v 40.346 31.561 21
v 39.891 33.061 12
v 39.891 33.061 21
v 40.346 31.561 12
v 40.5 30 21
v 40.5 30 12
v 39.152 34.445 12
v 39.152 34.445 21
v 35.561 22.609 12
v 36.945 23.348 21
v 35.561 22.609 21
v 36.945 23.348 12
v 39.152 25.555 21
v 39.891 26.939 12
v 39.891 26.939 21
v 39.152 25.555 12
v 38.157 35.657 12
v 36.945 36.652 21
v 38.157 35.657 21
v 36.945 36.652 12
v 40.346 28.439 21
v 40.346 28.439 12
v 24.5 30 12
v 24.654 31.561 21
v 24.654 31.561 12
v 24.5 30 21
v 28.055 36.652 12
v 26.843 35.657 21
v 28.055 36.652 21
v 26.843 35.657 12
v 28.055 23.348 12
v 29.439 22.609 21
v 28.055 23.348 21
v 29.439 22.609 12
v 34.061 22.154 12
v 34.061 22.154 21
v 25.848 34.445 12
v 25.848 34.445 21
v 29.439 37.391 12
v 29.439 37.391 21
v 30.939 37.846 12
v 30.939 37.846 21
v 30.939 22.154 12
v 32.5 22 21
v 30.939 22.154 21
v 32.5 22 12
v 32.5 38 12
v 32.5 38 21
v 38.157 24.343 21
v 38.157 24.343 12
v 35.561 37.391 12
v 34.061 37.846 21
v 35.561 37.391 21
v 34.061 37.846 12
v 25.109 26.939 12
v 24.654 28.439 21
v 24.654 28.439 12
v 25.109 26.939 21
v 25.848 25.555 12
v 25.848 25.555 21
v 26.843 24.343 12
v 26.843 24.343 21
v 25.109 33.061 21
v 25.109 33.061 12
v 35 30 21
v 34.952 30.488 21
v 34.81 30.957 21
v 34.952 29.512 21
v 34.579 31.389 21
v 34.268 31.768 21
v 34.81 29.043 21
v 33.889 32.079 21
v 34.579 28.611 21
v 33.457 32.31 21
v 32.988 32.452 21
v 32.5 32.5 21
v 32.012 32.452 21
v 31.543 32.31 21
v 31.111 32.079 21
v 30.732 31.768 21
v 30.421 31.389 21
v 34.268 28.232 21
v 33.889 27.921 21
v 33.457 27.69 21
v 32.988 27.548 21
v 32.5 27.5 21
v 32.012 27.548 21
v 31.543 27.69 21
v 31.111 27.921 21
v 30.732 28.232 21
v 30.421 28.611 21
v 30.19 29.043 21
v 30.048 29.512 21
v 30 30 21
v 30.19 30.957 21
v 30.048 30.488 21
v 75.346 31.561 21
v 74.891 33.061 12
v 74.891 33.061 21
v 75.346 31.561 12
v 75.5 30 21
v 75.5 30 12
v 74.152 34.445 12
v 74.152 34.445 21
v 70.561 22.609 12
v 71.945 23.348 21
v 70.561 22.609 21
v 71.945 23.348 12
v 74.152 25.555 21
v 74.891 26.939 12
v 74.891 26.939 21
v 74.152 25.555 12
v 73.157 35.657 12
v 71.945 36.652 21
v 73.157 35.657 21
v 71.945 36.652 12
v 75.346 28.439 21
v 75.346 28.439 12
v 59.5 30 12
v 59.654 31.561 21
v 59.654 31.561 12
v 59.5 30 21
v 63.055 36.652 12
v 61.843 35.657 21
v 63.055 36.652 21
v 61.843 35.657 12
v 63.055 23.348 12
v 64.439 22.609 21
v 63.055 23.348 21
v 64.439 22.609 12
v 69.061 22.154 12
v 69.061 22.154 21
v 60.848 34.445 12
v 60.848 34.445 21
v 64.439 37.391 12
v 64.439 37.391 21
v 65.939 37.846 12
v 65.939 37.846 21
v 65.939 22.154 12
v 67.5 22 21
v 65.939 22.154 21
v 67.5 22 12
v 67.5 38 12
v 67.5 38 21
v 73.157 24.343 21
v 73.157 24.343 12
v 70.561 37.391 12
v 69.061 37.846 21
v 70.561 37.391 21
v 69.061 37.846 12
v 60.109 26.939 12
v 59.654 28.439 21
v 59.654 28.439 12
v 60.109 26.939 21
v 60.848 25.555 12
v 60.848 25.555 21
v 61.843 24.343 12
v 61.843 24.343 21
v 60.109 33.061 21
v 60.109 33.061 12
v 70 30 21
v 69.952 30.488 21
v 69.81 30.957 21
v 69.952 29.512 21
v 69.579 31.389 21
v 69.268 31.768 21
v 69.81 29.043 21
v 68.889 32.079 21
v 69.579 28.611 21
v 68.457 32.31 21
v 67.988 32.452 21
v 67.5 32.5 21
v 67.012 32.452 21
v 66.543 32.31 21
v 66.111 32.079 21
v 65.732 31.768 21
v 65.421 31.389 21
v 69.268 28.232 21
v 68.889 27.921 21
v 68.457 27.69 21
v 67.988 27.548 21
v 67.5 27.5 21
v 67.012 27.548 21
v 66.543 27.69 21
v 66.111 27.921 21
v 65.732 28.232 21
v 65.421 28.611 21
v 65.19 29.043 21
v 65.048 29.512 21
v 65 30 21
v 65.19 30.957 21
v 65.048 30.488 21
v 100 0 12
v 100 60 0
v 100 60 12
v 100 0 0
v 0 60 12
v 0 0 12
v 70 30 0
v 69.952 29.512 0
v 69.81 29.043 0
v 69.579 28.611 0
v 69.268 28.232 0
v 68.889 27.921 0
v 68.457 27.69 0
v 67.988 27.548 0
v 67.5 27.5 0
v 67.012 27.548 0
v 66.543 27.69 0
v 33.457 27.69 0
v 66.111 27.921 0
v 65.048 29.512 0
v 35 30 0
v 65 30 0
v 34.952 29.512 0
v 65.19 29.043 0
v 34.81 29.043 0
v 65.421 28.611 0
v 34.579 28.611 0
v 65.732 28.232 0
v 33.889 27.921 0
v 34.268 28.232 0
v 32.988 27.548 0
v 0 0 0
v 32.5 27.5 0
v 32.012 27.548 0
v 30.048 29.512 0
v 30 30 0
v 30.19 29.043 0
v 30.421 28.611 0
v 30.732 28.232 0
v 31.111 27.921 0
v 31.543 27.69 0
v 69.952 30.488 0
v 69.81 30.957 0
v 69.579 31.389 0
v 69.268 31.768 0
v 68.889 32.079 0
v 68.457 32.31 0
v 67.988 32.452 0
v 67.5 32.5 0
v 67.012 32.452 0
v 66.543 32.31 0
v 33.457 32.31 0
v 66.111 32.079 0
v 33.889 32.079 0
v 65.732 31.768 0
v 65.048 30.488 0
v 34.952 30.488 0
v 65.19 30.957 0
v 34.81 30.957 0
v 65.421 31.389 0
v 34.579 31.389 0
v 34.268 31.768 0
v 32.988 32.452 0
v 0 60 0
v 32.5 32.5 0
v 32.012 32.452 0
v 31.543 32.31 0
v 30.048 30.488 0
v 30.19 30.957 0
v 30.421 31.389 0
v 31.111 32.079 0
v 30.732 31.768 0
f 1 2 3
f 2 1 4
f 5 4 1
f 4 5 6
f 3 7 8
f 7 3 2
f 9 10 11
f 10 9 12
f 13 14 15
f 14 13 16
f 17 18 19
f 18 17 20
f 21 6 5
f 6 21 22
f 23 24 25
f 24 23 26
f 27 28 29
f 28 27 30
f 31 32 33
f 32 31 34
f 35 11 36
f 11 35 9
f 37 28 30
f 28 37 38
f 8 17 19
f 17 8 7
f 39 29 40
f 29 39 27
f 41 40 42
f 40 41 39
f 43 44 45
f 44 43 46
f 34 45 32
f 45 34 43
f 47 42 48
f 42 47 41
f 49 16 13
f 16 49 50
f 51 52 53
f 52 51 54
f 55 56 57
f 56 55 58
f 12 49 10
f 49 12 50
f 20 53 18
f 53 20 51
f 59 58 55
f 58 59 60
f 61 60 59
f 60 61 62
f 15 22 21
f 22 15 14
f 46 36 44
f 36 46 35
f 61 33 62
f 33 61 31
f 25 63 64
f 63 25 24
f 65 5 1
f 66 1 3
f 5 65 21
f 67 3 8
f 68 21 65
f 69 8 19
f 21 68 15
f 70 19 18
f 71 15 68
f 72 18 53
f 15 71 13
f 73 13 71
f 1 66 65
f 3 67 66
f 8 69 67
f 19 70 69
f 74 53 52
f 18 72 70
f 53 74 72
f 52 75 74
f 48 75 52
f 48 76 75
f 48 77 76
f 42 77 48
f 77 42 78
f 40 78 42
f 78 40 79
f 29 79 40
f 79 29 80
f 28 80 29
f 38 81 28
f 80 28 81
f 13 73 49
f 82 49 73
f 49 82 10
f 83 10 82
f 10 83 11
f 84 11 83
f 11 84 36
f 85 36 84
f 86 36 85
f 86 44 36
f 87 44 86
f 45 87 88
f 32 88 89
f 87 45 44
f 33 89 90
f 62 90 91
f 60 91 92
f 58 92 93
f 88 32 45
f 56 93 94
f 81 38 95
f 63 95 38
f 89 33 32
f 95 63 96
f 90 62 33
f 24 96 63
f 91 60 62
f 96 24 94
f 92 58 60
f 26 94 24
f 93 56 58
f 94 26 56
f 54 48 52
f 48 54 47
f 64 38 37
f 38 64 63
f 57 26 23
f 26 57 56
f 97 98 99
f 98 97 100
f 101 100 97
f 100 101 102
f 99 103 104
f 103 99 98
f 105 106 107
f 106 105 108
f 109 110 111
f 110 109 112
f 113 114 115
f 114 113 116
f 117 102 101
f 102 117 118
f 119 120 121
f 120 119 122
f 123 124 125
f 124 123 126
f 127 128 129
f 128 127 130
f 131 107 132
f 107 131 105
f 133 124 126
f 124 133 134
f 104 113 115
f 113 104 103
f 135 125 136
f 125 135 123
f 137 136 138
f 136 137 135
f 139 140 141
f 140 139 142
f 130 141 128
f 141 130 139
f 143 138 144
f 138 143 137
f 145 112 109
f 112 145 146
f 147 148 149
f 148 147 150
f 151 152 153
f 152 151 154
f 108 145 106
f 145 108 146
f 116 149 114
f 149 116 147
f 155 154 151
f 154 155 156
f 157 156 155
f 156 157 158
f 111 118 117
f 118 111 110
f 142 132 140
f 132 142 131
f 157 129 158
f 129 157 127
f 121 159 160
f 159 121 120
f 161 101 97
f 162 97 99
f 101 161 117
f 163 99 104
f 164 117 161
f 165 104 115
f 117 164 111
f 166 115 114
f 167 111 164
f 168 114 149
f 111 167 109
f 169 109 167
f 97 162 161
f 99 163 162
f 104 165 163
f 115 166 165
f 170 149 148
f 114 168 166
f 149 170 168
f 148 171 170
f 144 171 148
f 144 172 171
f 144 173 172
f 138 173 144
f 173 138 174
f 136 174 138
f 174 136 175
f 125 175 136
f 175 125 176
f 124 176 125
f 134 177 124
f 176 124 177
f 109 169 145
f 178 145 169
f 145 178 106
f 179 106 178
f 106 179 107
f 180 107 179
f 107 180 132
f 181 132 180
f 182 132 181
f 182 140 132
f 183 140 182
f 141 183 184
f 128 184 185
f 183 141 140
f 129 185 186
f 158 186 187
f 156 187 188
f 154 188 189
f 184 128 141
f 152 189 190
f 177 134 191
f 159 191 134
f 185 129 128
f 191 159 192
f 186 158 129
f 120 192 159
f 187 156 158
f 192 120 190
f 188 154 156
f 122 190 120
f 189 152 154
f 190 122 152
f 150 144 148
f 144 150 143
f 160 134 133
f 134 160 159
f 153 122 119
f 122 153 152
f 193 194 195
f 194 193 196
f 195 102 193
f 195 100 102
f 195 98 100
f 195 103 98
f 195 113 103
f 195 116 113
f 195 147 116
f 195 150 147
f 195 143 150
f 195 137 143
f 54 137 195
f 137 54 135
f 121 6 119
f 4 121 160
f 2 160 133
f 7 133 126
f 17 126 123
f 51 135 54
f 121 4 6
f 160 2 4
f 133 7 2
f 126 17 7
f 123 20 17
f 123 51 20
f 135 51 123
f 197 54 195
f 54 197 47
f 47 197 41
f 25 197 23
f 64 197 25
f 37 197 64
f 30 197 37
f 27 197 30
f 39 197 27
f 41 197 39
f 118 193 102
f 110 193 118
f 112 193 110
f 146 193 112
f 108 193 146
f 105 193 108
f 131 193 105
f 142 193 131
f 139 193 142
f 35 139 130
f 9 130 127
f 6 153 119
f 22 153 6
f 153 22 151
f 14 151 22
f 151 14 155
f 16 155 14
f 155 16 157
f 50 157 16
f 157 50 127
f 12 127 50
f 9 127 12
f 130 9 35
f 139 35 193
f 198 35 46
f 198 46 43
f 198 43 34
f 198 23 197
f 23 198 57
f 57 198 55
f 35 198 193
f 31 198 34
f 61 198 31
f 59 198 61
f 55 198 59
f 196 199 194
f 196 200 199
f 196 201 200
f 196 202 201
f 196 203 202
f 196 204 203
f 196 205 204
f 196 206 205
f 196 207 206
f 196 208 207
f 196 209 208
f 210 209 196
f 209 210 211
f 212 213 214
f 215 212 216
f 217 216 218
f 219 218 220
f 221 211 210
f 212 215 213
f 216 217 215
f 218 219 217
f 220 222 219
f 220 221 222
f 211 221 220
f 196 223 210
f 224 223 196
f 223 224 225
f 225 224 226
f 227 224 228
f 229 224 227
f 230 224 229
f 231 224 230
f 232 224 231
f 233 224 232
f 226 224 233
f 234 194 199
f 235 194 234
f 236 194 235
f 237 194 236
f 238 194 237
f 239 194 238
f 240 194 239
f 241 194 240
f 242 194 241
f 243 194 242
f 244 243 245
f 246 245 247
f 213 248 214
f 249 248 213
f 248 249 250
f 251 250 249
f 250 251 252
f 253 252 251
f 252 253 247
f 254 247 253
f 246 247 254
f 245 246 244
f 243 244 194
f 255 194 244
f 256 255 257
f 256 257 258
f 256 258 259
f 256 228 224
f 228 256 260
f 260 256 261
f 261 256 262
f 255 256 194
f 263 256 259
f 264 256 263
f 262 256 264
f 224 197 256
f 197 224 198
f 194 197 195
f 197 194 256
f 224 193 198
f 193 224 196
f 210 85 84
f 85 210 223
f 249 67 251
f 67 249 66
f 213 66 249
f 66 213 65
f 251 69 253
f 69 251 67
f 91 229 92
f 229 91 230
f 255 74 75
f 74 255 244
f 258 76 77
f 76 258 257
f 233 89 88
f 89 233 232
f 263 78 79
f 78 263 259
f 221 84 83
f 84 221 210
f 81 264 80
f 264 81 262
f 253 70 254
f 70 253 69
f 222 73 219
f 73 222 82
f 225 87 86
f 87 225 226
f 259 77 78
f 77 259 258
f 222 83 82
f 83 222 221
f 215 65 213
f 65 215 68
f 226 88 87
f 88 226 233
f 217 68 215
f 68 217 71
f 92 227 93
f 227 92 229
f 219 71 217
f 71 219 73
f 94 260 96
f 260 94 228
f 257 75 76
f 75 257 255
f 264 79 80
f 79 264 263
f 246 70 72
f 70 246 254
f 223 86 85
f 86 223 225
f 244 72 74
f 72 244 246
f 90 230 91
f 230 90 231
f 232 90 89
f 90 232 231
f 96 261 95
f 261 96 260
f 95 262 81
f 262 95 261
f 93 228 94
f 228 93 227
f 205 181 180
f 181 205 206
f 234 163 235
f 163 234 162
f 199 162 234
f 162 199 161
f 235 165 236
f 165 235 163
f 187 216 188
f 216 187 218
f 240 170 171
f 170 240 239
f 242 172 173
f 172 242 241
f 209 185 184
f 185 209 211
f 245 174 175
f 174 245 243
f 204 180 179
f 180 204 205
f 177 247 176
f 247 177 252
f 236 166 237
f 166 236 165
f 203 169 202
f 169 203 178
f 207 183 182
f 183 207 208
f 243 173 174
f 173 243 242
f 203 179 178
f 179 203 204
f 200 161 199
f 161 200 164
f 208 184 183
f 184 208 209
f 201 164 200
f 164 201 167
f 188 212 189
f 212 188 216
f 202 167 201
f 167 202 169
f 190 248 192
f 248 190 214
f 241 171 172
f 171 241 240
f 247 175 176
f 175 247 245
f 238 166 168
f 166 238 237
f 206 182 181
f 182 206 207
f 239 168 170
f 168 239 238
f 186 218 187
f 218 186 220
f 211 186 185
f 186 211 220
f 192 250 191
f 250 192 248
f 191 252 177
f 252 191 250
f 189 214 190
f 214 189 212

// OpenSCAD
$fn = 32;

// ----------------------------------------------------------------------
// Drill jig: two_boss jig
// ----------------------------------------------------------------------

// --- parameters (mm) ---
plate_l = 100;            // plate length, X
plate_w = 60;             // plate width, Y
plate_t = 12;             // plate thickness
boss_d = 16;              // guide boss diameter
boss_h = 10;              // boss height above the plate
guide_d = 5;              // guide hole diameter
boss_pitch = 35;          // boss pitch

n_boss = 2;  // guide bosses
boss_x0 = (plate_l - (n_boss - 1) * boss_pitch) / 2;  // first boss X
boss_top = plate_t - 1 + boss_h;  // boss crown height
total_h = boss_top;  // overall height

difference() {
  union() {
  cube([plate_l, plate_w, plate_t]);
  for (i = [0 : n_boss - 1])
    translate([boss_x0 + i * boss_pitch, plate_w / 2, plate_t - 1])
      cylinder(h = boss_h, d = boss_d);
  }
  for (i = [0 : n_boss - 1])
    translate([boss_x0 + i * boss_pitch, plate_w / 2, -1])
      cylinder(h = plate_t + boss_h, d = guide_d);
}
